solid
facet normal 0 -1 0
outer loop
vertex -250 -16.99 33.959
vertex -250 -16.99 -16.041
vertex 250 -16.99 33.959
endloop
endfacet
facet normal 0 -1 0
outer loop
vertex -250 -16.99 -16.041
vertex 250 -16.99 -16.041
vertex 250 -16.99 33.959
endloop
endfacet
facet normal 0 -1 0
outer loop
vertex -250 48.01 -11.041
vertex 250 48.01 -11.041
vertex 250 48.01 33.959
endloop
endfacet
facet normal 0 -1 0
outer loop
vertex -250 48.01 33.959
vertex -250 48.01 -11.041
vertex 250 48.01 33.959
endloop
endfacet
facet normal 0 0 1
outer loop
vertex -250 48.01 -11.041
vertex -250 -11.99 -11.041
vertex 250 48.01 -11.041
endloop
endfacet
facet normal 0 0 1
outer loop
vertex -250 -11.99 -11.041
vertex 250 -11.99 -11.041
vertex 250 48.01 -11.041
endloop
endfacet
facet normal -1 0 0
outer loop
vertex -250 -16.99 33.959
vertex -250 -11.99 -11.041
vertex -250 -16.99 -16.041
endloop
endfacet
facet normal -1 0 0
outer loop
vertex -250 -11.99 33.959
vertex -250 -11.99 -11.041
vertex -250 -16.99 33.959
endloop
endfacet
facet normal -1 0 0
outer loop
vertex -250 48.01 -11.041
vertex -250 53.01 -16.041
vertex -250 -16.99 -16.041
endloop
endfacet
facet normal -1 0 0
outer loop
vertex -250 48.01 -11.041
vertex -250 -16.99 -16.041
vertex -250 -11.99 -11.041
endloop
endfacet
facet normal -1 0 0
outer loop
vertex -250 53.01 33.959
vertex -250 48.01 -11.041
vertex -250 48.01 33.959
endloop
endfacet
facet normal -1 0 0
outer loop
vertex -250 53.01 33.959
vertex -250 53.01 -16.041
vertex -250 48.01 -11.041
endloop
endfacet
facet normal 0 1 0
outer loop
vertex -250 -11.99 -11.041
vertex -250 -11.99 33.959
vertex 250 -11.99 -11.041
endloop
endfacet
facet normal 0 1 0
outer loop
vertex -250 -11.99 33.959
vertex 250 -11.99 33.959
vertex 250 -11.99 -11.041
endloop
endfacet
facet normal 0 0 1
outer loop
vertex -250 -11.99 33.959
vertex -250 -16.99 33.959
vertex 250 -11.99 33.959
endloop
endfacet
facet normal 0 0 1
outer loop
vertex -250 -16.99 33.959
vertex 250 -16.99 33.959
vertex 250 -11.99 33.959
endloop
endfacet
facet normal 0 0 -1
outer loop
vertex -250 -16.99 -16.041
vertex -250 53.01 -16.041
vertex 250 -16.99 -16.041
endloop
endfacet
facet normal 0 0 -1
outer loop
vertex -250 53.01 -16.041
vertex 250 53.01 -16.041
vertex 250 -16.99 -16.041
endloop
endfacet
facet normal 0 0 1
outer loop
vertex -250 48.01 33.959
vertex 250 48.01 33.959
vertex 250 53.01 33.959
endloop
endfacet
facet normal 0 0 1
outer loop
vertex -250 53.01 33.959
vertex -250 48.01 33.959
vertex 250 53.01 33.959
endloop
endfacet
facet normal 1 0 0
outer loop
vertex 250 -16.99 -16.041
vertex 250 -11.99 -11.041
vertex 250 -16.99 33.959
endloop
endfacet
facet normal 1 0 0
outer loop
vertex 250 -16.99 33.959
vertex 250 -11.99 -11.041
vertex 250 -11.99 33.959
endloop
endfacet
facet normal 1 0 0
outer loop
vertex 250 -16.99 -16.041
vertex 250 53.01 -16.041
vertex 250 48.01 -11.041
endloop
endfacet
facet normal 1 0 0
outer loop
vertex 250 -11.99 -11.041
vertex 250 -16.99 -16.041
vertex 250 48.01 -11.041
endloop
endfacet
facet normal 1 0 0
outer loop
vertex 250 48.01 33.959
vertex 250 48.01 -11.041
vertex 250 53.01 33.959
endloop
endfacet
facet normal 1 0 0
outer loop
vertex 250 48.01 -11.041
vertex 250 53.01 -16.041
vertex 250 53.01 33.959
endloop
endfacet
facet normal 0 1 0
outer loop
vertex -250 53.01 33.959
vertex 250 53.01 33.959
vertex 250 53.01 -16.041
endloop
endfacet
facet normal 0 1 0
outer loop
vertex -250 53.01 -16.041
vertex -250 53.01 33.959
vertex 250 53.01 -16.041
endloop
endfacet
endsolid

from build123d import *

# Parameters (mm, degrees)
BOSS_EXTRUDE1_DEPTH = 250


with BuildPart() as part:
    # Sketch1 → Boss-Extrude1 (new body, symmetric)
    with BuildSketch(Plane(origin=(0, 0, 0), x_dir=(0, 0, -1), z_dir=(1, 0, 0))):
        Polygon((-33.959336145, 53.010184438), (16.040663855, 53.010184438), (16.040663855, -16.989815562), (-33.959336145, -16.989815562), (-33.959336145, -11.989815562), (11.040663855, -11.989815562), (11.040663855, 48.010184438), (-33.959336145, 48.010184438), align=None)
    extrude(amount=BOSS_EXTRUDE1_DEPTH, both=True)


solid = part.part
